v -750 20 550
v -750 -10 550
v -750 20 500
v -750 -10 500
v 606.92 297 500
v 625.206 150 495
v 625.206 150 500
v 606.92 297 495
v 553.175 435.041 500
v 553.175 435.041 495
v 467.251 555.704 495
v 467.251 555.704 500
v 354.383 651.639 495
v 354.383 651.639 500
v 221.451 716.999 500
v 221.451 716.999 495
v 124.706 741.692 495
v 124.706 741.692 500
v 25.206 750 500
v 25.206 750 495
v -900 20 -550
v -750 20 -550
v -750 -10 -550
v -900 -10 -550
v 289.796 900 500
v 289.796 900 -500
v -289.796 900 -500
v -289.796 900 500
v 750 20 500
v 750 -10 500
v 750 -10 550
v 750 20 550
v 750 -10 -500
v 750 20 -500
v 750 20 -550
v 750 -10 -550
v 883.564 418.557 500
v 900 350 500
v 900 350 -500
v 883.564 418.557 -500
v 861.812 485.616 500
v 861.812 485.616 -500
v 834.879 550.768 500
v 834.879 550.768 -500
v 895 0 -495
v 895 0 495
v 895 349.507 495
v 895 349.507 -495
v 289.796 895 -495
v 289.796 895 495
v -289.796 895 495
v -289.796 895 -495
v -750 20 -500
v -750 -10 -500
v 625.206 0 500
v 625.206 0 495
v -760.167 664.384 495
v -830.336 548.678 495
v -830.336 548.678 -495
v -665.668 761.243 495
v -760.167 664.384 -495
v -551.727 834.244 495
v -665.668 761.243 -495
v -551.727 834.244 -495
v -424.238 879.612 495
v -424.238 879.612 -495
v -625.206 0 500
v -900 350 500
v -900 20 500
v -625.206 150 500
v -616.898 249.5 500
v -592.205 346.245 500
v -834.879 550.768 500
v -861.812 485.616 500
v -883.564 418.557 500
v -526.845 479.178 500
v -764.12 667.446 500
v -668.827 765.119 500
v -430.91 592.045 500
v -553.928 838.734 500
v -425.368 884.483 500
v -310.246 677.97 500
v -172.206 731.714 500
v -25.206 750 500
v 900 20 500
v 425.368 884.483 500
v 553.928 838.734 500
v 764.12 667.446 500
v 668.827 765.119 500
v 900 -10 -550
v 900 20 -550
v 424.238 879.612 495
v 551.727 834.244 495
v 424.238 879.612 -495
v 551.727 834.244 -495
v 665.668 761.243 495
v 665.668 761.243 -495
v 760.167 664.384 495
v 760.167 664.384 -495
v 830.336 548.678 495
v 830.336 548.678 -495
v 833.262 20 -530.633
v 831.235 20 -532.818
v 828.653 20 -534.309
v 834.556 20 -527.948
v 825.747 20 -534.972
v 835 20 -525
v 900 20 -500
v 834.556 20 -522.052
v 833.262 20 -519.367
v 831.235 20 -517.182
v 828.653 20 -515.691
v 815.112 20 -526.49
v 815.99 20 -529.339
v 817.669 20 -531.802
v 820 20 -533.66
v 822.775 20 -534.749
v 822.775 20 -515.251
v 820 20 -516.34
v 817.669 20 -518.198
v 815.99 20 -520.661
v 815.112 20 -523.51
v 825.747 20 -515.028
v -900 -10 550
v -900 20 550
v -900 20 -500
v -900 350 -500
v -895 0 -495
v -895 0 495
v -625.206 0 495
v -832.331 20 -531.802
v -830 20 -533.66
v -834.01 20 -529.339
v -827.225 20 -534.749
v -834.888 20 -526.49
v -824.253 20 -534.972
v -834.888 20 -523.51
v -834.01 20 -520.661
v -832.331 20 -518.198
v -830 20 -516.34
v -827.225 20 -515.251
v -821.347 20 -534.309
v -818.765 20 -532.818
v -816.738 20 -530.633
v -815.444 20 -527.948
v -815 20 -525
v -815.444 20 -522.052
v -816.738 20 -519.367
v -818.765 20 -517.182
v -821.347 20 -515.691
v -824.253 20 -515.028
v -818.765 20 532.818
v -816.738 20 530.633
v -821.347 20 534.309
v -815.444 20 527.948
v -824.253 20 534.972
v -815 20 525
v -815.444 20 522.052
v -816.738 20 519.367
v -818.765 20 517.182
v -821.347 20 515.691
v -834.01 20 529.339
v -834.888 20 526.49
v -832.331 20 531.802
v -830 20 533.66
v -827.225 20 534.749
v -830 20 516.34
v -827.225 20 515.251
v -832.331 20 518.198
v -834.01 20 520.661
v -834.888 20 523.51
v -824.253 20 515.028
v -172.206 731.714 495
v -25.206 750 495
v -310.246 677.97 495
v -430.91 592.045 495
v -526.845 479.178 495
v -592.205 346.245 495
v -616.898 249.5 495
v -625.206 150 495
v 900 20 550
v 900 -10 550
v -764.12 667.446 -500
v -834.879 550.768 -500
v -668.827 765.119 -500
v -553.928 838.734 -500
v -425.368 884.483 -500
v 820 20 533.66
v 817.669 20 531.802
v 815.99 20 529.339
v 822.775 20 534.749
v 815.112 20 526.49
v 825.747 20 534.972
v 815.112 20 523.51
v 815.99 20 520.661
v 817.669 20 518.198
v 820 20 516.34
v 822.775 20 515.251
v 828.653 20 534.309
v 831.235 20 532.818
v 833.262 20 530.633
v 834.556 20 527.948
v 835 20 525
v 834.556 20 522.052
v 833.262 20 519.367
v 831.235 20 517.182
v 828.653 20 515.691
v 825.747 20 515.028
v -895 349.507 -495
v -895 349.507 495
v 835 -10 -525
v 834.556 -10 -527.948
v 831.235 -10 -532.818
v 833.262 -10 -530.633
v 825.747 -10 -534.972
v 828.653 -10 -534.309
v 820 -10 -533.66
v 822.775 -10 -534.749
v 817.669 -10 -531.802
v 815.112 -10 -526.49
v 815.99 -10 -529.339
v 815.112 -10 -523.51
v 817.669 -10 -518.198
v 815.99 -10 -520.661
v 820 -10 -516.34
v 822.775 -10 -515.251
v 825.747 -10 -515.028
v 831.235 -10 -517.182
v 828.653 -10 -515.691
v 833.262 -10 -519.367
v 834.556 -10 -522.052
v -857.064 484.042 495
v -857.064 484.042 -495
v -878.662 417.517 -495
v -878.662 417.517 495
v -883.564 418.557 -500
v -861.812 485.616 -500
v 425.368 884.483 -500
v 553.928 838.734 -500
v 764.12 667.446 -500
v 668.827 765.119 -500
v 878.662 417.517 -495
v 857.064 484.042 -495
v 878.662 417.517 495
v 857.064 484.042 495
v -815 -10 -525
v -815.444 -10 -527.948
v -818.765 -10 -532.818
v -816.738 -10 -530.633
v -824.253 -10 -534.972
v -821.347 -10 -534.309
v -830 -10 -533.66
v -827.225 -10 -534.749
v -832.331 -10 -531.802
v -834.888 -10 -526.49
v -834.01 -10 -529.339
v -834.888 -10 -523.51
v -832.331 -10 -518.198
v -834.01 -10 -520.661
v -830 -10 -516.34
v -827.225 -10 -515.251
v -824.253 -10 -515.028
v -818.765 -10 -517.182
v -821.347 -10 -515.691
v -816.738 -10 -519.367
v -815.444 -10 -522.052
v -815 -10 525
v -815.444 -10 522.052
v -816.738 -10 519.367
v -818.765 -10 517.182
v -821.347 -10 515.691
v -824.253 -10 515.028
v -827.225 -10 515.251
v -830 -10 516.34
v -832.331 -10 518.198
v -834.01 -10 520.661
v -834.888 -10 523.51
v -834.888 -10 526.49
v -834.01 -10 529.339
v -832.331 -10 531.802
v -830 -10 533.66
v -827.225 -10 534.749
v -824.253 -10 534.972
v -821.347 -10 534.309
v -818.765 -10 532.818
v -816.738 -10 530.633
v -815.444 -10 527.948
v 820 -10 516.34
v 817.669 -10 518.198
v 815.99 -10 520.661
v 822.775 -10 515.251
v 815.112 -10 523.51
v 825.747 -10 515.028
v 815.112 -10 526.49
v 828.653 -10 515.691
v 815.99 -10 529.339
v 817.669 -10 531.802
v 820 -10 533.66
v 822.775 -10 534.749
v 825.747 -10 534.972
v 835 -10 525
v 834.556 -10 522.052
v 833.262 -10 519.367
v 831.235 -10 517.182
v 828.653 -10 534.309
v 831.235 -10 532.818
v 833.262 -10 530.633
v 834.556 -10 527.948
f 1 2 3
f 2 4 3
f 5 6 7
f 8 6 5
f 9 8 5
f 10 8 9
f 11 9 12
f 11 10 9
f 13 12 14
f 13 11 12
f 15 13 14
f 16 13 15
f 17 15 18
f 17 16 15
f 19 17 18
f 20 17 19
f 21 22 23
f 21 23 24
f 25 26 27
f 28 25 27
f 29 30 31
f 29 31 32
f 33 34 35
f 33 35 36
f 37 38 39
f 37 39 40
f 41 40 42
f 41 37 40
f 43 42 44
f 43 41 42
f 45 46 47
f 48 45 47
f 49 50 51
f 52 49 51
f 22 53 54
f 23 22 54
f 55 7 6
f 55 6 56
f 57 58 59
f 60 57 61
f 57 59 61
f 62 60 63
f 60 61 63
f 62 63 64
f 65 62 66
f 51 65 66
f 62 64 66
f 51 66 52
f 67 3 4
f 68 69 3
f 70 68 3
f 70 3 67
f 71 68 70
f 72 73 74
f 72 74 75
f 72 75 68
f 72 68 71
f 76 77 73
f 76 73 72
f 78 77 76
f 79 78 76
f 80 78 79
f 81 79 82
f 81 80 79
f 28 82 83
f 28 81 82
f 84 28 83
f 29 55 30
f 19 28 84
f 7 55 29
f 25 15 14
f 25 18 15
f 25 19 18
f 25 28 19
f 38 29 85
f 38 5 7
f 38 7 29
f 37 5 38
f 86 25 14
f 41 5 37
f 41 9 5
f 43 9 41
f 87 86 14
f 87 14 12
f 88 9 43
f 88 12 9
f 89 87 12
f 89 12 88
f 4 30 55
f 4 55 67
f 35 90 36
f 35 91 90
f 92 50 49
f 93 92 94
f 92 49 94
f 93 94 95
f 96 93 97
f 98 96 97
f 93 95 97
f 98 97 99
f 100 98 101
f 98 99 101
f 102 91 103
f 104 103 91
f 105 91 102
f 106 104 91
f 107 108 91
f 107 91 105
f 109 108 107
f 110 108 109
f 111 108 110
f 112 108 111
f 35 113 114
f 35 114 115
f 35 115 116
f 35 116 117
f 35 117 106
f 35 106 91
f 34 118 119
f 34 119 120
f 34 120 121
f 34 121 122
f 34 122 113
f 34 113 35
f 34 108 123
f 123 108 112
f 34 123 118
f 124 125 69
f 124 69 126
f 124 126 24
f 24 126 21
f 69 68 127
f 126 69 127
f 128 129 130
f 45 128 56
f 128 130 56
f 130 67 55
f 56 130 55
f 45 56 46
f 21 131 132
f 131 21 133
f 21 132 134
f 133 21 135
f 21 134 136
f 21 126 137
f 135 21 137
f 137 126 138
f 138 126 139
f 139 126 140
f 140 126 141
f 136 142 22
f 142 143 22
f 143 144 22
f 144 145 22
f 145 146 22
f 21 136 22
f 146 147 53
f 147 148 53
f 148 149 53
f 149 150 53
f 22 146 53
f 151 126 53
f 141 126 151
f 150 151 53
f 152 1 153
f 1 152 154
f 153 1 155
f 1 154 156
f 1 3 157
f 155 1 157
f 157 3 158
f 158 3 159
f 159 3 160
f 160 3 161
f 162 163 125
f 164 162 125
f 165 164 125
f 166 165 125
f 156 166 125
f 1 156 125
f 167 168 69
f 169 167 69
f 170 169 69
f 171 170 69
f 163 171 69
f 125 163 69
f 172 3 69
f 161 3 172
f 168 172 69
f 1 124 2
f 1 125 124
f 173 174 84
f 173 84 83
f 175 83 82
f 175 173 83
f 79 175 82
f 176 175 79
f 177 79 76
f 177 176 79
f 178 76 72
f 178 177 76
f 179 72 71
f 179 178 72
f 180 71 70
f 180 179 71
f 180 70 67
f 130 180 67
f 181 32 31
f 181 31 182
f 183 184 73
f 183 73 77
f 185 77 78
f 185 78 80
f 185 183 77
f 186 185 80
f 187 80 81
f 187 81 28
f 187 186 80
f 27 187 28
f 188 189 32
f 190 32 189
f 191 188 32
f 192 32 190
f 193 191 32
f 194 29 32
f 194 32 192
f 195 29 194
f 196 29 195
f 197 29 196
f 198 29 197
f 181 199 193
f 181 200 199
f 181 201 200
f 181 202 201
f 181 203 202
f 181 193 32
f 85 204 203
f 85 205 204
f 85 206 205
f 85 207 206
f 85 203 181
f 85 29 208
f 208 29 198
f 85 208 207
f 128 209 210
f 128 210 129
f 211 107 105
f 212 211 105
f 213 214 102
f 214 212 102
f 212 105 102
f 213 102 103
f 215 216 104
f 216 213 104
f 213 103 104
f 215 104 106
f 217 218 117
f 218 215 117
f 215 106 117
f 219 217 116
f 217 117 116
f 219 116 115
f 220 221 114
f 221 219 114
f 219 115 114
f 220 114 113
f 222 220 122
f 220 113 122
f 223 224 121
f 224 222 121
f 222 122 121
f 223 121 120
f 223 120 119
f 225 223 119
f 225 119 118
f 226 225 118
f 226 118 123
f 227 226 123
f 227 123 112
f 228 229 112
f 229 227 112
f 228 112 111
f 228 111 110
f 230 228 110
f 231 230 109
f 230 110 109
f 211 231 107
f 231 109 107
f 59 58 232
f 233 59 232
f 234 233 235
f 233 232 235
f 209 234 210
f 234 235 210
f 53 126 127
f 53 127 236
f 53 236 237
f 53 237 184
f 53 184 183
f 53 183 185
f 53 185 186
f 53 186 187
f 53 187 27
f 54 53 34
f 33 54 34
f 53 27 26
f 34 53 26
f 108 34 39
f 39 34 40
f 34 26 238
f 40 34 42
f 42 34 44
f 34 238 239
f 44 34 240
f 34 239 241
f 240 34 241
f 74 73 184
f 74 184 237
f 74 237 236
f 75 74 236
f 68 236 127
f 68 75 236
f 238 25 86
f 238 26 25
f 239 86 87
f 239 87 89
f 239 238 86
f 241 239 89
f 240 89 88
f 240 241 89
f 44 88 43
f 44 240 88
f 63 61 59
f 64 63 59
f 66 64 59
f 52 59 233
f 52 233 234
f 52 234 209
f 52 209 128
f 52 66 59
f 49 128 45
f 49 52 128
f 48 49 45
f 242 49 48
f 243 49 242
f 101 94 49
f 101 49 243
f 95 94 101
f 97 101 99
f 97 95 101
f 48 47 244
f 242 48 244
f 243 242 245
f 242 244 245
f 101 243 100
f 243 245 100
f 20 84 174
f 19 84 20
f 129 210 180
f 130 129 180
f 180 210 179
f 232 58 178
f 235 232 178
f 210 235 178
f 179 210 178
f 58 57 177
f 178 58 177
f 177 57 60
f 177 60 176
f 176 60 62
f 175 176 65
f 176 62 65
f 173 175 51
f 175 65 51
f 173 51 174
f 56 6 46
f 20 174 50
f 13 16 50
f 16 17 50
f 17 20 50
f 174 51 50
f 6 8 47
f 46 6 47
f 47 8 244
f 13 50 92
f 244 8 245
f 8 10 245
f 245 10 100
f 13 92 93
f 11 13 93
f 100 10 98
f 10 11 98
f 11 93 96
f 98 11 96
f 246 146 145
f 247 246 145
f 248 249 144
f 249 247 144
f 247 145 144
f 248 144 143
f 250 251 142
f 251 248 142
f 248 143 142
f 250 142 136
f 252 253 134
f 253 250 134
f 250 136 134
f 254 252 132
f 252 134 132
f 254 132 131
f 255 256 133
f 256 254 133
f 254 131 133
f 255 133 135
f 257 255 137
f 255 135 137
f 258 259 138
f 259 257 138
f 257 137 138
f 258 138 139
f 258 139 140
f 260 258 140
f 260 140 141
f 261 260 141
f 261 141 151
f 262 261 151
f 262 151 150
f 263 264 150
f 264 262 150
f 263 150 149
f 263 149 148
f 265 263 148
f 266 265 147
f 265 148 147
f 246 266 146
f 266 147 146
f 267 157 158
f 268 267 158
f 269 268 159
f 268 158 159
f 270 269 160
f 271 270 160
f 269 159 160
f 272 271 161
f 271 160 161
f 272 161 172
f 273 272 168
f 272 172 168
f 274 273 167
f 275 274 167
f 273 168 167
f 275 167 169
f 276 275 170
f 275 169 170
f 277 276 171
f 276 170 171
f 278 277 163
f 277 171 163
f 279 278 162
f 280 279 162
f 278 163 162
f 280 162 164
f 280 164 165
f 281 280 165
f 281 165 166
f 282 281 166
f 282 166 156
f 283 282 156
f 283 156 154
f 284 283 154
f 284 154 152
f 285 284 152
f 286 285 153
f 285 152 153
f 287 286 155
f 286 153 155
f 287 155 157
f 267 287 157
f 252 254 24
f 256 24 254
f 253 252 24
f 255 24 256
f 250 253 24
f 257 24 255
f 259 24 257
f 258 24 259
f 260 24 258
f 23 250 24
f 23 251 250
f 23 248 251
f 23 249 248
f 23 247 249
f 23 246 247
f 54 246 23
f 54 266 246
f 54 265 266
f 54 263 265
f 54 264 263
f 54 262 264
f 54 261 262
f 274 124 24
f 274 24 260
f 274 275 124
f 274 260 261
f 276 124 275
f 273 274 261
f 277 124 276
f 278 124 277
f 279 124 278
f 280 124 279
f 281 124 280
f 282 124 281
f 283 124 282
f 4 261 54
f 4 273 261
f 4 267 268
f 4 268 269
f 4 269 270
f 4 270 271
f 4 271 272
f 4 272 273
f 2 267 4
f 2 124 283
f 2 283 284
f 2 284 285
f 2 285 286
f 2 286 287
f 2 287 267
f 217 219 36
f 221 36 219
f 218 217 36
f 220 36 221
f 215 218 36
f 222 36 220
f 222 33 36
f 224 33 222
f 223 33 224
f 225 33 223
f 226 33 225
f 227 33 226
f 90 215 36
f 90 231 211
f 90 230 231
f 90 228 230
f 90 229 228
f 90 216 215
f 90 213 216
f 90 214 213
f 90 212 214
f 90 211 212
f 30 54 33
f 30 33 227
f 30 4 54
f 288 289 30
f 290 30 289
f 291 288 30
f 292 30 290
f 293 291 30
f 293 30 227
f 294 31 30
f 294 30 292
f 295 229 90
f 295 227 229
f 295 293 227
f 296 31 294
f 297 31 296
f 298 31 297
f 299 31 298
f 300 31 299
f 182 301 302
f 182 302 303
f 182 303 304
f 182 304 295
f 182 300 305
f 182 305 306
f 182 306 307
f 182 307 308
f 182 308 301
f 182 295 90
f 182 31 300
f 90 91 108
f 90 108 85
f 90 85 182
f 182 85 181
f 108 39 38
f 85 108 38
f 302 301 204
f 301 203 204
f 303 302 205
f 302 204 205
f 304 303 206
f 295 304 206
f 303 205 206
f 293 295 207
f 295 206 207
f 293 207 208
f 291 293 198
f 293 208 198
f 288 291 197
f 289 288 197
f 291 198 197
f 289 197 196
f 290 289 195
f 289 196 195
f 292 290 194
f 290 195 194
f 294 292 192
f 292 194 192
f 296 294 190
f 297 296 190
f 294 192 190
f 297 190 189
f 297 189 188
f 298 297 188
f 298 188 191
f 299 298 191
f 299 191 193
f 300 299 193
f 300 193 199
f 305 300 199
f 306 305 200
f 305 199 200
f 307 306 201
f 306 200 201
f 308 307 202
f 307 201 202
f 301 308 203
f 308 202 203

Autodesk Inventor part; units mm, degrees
ref_plane "YZ Plane" through (0, 0, 0) normal (1, 0, 0) x (0, 1, 0)
ref_plane "XZ Plane" through (0, 0, 0) normal (0, 1, 0) x (-1, 0, 0)
ref_plane "XY Plane" through (0, 0, 0) normal (0, 0, 1) x (1, 0, 0)
sketch "Sketch1" plane through (0, 0, 0) normal (0, 0, 1) x (1, 0, 0)
  line L0 (-900, 0) -> (900, 0)
  line L1 (900, 0) -> (900, 900)
  line L2 (900, 900) -> (-900, 900)
  line L3 (-900, 900) -> (-900, 0)
  line L4 (0, 900) -> (0, 0) construction
  dimension "d0" = 900
  dimension "length" = 1800
extrude "Extrusion1" add sketch "Sketch1" along normal mid plane 1000
sketch "Sketch2" plane through (0, 0, 500) normal (0, 0, 1) x (1, 0, 0)
  line L0 (-900, 900) -> (-900, 0) projected
  arc A0 (-550, 900) -> (-900, 350) centre (-17.254, 174.6162) ccw
  line L1 (900, 900) -> (-900, 900) projected
  line L2 (-900, 350) -> (-900, 900)
  line L3 (-900, 900) -> (-550, 900)
  point P0 (0, 0)
  dimension "d5" = 900
  dimension "d6" = 550
  dimension "d7" = 350
extrude "Extrusion2" cut sketch "Sketch2" against normal blind 1000
mirror "Mirror1" about plane through (0, 0, 0) normal (1, 0, 0) of "Extrusion2"
fillet "Fillet1" radius 600 2 edges at (-550, 900, 0) (550, 900, 0)
sketch "Sketch3" plane through (0, 0, 500) normal (0, 0, 1) x (1, 0, 0)
  arc A0 (-289.7955, 900) -> (-834.8786, 550.7676) centre (-289.7955, 300) ccw projected
  line L0 (289.7955, 900) -> (-289.7955, 900) projected
  arc A1 (834.8786, 550.7676) -> (289.7955, 900) centre (289.7955, 300) ccw projected
  arc A2 (-289.7955, 750) -> (-625.2057, 600) centre (-289.7955, 300) ccw
  line L1 (-289.7955, 750) -> (289.7955, 750)
  arc A3 (625.2057, 600) -> (289.7955, 750) centre (289.7955, 300) ccw
  line L2 (-625.2057, 600) -> (-625.2057, 0)
  line L3 (900, 0) -> (-900, 0) projected
  line L4 (625.2057, 600) -> (625.2057, 0)
  line L5 (625.2057, 0) -> (-625.2057, 0)
  point P0 (0, 0)
  point P1 (625.2057, 0)
  dimension "d11" = 150
  dimension "d12" = 600
shell "Shell2" thickness 5 removed faces 1 at (300, 0, 166.6667)
extrude "Extrusion3" cut sketch "Sketch3" against normal blind 10
fillet "Fillet2" radius 600 2 edges at (-625.2057, 600, 497.5) (625.2057, 600, 497.5)
sketch "Sketch4" plane through (-900, 0, -500) normal (0, -1, 0) x (1, 0, 0)
  line L0 (1525.2057, 1000) -> (1800, 1000) projected
  line L1 (0, 0) -> (1800, 0)
  line L2 (1800, 0) -> (1800, 1000)
  line L3 (1800, 1000) -> (0, 1000)
  line L4 (0, 1000) -> (0, 0)
  point P0 (900, 500)
extrude "Extrusion4" add sketch "Sketch4" along normal blind 10
sketch "Sketch5" plane through (0, 0, 500) normal (0, 0, 1) x (1, 0, 0)
  line L0 (-900, -10) -> (900, -10) projected
  line L1 (-900, -10) -> (-750, -10)
  line L2 (-750, -10) -> (-750, 20)
  line L3 (-750, 20) -> (-900, 20)
  line L4 (-900, 20) -> (-900, -10)
  line L5 (900, -10) -> (750, -10)
  line L6 (750, -10) -> (750, 20)
  line L7 (750, 20) -> (900, 20)
  line L8 (900, 20) -> (900, -10)
  point P0 (0, 0)
  dimension "d19" = 30
  dimension "d20" = 150
extrude "Extrusion5" add sketch "Sketch5" along normal blind 50
sketch "Sketch6" plane through (-900, 20, 500) normal (0, 1, 0) x (1, 0, 0)
  circle A0 centre (75, -25) radius 10
  circle A1 centre (1725, -25) radius 10
  line L0 (75, -25) -> (1725, -25) construction
  line L1 (1800, -50) -> (1650, -50) construction
  line L2 (1650, 0) -> (1650, -50) construction
  line L3 (0, 0) -> (0, -50) construction
  line L4 (75, -25) -> (0, -25) construction
  line L5 (1725, -25) -> (1800, -25) construction
  line L6 (1800, 1000) -> (1800, -50) construction
  point P0 (900, 500)
  dimension "d25" = 20
  dimension "d31" = 1650
  dimension "d32" = 75
extrude "Extrusion6" cut sketch "Sketch6" against normal blind 30
mirror "Mirror2" about plane through (0, 0, 0) normal (0, 0, 1) of "Extrusion6", "Extrusion5"
ref_plane "Work Plane1" through (0, 0, 0) normal (1, 0, 0) x (0, 1, 0)
equation "\"d0\" = 0.5 * length"
equation "\"d5\" = 0.5 * length"
equation "\"d11\" = 0.0833333 * length"
equation "\"d12\" = 0.333333 * length"
equation "\"d13\" = 0.00277778 * length"
equation "\"d14\" = 0.00555556 * length"
equation "\"d17\" = 0.00555556 * length"
equation "\"d19\" = 0.0166667 * length"
equation "\"d20\" = 0.0833333 * length"
equation "\"d23\" = 0.0277778 * length"
equation "\"d25\" = 0.02 * d2"
equation "\"d32\" = 0.0416667 * length"
equation "\"d29\" = 0.0166667 * length"
equation "\"d2\" = 1000"
properties part number "COVER, updated"
